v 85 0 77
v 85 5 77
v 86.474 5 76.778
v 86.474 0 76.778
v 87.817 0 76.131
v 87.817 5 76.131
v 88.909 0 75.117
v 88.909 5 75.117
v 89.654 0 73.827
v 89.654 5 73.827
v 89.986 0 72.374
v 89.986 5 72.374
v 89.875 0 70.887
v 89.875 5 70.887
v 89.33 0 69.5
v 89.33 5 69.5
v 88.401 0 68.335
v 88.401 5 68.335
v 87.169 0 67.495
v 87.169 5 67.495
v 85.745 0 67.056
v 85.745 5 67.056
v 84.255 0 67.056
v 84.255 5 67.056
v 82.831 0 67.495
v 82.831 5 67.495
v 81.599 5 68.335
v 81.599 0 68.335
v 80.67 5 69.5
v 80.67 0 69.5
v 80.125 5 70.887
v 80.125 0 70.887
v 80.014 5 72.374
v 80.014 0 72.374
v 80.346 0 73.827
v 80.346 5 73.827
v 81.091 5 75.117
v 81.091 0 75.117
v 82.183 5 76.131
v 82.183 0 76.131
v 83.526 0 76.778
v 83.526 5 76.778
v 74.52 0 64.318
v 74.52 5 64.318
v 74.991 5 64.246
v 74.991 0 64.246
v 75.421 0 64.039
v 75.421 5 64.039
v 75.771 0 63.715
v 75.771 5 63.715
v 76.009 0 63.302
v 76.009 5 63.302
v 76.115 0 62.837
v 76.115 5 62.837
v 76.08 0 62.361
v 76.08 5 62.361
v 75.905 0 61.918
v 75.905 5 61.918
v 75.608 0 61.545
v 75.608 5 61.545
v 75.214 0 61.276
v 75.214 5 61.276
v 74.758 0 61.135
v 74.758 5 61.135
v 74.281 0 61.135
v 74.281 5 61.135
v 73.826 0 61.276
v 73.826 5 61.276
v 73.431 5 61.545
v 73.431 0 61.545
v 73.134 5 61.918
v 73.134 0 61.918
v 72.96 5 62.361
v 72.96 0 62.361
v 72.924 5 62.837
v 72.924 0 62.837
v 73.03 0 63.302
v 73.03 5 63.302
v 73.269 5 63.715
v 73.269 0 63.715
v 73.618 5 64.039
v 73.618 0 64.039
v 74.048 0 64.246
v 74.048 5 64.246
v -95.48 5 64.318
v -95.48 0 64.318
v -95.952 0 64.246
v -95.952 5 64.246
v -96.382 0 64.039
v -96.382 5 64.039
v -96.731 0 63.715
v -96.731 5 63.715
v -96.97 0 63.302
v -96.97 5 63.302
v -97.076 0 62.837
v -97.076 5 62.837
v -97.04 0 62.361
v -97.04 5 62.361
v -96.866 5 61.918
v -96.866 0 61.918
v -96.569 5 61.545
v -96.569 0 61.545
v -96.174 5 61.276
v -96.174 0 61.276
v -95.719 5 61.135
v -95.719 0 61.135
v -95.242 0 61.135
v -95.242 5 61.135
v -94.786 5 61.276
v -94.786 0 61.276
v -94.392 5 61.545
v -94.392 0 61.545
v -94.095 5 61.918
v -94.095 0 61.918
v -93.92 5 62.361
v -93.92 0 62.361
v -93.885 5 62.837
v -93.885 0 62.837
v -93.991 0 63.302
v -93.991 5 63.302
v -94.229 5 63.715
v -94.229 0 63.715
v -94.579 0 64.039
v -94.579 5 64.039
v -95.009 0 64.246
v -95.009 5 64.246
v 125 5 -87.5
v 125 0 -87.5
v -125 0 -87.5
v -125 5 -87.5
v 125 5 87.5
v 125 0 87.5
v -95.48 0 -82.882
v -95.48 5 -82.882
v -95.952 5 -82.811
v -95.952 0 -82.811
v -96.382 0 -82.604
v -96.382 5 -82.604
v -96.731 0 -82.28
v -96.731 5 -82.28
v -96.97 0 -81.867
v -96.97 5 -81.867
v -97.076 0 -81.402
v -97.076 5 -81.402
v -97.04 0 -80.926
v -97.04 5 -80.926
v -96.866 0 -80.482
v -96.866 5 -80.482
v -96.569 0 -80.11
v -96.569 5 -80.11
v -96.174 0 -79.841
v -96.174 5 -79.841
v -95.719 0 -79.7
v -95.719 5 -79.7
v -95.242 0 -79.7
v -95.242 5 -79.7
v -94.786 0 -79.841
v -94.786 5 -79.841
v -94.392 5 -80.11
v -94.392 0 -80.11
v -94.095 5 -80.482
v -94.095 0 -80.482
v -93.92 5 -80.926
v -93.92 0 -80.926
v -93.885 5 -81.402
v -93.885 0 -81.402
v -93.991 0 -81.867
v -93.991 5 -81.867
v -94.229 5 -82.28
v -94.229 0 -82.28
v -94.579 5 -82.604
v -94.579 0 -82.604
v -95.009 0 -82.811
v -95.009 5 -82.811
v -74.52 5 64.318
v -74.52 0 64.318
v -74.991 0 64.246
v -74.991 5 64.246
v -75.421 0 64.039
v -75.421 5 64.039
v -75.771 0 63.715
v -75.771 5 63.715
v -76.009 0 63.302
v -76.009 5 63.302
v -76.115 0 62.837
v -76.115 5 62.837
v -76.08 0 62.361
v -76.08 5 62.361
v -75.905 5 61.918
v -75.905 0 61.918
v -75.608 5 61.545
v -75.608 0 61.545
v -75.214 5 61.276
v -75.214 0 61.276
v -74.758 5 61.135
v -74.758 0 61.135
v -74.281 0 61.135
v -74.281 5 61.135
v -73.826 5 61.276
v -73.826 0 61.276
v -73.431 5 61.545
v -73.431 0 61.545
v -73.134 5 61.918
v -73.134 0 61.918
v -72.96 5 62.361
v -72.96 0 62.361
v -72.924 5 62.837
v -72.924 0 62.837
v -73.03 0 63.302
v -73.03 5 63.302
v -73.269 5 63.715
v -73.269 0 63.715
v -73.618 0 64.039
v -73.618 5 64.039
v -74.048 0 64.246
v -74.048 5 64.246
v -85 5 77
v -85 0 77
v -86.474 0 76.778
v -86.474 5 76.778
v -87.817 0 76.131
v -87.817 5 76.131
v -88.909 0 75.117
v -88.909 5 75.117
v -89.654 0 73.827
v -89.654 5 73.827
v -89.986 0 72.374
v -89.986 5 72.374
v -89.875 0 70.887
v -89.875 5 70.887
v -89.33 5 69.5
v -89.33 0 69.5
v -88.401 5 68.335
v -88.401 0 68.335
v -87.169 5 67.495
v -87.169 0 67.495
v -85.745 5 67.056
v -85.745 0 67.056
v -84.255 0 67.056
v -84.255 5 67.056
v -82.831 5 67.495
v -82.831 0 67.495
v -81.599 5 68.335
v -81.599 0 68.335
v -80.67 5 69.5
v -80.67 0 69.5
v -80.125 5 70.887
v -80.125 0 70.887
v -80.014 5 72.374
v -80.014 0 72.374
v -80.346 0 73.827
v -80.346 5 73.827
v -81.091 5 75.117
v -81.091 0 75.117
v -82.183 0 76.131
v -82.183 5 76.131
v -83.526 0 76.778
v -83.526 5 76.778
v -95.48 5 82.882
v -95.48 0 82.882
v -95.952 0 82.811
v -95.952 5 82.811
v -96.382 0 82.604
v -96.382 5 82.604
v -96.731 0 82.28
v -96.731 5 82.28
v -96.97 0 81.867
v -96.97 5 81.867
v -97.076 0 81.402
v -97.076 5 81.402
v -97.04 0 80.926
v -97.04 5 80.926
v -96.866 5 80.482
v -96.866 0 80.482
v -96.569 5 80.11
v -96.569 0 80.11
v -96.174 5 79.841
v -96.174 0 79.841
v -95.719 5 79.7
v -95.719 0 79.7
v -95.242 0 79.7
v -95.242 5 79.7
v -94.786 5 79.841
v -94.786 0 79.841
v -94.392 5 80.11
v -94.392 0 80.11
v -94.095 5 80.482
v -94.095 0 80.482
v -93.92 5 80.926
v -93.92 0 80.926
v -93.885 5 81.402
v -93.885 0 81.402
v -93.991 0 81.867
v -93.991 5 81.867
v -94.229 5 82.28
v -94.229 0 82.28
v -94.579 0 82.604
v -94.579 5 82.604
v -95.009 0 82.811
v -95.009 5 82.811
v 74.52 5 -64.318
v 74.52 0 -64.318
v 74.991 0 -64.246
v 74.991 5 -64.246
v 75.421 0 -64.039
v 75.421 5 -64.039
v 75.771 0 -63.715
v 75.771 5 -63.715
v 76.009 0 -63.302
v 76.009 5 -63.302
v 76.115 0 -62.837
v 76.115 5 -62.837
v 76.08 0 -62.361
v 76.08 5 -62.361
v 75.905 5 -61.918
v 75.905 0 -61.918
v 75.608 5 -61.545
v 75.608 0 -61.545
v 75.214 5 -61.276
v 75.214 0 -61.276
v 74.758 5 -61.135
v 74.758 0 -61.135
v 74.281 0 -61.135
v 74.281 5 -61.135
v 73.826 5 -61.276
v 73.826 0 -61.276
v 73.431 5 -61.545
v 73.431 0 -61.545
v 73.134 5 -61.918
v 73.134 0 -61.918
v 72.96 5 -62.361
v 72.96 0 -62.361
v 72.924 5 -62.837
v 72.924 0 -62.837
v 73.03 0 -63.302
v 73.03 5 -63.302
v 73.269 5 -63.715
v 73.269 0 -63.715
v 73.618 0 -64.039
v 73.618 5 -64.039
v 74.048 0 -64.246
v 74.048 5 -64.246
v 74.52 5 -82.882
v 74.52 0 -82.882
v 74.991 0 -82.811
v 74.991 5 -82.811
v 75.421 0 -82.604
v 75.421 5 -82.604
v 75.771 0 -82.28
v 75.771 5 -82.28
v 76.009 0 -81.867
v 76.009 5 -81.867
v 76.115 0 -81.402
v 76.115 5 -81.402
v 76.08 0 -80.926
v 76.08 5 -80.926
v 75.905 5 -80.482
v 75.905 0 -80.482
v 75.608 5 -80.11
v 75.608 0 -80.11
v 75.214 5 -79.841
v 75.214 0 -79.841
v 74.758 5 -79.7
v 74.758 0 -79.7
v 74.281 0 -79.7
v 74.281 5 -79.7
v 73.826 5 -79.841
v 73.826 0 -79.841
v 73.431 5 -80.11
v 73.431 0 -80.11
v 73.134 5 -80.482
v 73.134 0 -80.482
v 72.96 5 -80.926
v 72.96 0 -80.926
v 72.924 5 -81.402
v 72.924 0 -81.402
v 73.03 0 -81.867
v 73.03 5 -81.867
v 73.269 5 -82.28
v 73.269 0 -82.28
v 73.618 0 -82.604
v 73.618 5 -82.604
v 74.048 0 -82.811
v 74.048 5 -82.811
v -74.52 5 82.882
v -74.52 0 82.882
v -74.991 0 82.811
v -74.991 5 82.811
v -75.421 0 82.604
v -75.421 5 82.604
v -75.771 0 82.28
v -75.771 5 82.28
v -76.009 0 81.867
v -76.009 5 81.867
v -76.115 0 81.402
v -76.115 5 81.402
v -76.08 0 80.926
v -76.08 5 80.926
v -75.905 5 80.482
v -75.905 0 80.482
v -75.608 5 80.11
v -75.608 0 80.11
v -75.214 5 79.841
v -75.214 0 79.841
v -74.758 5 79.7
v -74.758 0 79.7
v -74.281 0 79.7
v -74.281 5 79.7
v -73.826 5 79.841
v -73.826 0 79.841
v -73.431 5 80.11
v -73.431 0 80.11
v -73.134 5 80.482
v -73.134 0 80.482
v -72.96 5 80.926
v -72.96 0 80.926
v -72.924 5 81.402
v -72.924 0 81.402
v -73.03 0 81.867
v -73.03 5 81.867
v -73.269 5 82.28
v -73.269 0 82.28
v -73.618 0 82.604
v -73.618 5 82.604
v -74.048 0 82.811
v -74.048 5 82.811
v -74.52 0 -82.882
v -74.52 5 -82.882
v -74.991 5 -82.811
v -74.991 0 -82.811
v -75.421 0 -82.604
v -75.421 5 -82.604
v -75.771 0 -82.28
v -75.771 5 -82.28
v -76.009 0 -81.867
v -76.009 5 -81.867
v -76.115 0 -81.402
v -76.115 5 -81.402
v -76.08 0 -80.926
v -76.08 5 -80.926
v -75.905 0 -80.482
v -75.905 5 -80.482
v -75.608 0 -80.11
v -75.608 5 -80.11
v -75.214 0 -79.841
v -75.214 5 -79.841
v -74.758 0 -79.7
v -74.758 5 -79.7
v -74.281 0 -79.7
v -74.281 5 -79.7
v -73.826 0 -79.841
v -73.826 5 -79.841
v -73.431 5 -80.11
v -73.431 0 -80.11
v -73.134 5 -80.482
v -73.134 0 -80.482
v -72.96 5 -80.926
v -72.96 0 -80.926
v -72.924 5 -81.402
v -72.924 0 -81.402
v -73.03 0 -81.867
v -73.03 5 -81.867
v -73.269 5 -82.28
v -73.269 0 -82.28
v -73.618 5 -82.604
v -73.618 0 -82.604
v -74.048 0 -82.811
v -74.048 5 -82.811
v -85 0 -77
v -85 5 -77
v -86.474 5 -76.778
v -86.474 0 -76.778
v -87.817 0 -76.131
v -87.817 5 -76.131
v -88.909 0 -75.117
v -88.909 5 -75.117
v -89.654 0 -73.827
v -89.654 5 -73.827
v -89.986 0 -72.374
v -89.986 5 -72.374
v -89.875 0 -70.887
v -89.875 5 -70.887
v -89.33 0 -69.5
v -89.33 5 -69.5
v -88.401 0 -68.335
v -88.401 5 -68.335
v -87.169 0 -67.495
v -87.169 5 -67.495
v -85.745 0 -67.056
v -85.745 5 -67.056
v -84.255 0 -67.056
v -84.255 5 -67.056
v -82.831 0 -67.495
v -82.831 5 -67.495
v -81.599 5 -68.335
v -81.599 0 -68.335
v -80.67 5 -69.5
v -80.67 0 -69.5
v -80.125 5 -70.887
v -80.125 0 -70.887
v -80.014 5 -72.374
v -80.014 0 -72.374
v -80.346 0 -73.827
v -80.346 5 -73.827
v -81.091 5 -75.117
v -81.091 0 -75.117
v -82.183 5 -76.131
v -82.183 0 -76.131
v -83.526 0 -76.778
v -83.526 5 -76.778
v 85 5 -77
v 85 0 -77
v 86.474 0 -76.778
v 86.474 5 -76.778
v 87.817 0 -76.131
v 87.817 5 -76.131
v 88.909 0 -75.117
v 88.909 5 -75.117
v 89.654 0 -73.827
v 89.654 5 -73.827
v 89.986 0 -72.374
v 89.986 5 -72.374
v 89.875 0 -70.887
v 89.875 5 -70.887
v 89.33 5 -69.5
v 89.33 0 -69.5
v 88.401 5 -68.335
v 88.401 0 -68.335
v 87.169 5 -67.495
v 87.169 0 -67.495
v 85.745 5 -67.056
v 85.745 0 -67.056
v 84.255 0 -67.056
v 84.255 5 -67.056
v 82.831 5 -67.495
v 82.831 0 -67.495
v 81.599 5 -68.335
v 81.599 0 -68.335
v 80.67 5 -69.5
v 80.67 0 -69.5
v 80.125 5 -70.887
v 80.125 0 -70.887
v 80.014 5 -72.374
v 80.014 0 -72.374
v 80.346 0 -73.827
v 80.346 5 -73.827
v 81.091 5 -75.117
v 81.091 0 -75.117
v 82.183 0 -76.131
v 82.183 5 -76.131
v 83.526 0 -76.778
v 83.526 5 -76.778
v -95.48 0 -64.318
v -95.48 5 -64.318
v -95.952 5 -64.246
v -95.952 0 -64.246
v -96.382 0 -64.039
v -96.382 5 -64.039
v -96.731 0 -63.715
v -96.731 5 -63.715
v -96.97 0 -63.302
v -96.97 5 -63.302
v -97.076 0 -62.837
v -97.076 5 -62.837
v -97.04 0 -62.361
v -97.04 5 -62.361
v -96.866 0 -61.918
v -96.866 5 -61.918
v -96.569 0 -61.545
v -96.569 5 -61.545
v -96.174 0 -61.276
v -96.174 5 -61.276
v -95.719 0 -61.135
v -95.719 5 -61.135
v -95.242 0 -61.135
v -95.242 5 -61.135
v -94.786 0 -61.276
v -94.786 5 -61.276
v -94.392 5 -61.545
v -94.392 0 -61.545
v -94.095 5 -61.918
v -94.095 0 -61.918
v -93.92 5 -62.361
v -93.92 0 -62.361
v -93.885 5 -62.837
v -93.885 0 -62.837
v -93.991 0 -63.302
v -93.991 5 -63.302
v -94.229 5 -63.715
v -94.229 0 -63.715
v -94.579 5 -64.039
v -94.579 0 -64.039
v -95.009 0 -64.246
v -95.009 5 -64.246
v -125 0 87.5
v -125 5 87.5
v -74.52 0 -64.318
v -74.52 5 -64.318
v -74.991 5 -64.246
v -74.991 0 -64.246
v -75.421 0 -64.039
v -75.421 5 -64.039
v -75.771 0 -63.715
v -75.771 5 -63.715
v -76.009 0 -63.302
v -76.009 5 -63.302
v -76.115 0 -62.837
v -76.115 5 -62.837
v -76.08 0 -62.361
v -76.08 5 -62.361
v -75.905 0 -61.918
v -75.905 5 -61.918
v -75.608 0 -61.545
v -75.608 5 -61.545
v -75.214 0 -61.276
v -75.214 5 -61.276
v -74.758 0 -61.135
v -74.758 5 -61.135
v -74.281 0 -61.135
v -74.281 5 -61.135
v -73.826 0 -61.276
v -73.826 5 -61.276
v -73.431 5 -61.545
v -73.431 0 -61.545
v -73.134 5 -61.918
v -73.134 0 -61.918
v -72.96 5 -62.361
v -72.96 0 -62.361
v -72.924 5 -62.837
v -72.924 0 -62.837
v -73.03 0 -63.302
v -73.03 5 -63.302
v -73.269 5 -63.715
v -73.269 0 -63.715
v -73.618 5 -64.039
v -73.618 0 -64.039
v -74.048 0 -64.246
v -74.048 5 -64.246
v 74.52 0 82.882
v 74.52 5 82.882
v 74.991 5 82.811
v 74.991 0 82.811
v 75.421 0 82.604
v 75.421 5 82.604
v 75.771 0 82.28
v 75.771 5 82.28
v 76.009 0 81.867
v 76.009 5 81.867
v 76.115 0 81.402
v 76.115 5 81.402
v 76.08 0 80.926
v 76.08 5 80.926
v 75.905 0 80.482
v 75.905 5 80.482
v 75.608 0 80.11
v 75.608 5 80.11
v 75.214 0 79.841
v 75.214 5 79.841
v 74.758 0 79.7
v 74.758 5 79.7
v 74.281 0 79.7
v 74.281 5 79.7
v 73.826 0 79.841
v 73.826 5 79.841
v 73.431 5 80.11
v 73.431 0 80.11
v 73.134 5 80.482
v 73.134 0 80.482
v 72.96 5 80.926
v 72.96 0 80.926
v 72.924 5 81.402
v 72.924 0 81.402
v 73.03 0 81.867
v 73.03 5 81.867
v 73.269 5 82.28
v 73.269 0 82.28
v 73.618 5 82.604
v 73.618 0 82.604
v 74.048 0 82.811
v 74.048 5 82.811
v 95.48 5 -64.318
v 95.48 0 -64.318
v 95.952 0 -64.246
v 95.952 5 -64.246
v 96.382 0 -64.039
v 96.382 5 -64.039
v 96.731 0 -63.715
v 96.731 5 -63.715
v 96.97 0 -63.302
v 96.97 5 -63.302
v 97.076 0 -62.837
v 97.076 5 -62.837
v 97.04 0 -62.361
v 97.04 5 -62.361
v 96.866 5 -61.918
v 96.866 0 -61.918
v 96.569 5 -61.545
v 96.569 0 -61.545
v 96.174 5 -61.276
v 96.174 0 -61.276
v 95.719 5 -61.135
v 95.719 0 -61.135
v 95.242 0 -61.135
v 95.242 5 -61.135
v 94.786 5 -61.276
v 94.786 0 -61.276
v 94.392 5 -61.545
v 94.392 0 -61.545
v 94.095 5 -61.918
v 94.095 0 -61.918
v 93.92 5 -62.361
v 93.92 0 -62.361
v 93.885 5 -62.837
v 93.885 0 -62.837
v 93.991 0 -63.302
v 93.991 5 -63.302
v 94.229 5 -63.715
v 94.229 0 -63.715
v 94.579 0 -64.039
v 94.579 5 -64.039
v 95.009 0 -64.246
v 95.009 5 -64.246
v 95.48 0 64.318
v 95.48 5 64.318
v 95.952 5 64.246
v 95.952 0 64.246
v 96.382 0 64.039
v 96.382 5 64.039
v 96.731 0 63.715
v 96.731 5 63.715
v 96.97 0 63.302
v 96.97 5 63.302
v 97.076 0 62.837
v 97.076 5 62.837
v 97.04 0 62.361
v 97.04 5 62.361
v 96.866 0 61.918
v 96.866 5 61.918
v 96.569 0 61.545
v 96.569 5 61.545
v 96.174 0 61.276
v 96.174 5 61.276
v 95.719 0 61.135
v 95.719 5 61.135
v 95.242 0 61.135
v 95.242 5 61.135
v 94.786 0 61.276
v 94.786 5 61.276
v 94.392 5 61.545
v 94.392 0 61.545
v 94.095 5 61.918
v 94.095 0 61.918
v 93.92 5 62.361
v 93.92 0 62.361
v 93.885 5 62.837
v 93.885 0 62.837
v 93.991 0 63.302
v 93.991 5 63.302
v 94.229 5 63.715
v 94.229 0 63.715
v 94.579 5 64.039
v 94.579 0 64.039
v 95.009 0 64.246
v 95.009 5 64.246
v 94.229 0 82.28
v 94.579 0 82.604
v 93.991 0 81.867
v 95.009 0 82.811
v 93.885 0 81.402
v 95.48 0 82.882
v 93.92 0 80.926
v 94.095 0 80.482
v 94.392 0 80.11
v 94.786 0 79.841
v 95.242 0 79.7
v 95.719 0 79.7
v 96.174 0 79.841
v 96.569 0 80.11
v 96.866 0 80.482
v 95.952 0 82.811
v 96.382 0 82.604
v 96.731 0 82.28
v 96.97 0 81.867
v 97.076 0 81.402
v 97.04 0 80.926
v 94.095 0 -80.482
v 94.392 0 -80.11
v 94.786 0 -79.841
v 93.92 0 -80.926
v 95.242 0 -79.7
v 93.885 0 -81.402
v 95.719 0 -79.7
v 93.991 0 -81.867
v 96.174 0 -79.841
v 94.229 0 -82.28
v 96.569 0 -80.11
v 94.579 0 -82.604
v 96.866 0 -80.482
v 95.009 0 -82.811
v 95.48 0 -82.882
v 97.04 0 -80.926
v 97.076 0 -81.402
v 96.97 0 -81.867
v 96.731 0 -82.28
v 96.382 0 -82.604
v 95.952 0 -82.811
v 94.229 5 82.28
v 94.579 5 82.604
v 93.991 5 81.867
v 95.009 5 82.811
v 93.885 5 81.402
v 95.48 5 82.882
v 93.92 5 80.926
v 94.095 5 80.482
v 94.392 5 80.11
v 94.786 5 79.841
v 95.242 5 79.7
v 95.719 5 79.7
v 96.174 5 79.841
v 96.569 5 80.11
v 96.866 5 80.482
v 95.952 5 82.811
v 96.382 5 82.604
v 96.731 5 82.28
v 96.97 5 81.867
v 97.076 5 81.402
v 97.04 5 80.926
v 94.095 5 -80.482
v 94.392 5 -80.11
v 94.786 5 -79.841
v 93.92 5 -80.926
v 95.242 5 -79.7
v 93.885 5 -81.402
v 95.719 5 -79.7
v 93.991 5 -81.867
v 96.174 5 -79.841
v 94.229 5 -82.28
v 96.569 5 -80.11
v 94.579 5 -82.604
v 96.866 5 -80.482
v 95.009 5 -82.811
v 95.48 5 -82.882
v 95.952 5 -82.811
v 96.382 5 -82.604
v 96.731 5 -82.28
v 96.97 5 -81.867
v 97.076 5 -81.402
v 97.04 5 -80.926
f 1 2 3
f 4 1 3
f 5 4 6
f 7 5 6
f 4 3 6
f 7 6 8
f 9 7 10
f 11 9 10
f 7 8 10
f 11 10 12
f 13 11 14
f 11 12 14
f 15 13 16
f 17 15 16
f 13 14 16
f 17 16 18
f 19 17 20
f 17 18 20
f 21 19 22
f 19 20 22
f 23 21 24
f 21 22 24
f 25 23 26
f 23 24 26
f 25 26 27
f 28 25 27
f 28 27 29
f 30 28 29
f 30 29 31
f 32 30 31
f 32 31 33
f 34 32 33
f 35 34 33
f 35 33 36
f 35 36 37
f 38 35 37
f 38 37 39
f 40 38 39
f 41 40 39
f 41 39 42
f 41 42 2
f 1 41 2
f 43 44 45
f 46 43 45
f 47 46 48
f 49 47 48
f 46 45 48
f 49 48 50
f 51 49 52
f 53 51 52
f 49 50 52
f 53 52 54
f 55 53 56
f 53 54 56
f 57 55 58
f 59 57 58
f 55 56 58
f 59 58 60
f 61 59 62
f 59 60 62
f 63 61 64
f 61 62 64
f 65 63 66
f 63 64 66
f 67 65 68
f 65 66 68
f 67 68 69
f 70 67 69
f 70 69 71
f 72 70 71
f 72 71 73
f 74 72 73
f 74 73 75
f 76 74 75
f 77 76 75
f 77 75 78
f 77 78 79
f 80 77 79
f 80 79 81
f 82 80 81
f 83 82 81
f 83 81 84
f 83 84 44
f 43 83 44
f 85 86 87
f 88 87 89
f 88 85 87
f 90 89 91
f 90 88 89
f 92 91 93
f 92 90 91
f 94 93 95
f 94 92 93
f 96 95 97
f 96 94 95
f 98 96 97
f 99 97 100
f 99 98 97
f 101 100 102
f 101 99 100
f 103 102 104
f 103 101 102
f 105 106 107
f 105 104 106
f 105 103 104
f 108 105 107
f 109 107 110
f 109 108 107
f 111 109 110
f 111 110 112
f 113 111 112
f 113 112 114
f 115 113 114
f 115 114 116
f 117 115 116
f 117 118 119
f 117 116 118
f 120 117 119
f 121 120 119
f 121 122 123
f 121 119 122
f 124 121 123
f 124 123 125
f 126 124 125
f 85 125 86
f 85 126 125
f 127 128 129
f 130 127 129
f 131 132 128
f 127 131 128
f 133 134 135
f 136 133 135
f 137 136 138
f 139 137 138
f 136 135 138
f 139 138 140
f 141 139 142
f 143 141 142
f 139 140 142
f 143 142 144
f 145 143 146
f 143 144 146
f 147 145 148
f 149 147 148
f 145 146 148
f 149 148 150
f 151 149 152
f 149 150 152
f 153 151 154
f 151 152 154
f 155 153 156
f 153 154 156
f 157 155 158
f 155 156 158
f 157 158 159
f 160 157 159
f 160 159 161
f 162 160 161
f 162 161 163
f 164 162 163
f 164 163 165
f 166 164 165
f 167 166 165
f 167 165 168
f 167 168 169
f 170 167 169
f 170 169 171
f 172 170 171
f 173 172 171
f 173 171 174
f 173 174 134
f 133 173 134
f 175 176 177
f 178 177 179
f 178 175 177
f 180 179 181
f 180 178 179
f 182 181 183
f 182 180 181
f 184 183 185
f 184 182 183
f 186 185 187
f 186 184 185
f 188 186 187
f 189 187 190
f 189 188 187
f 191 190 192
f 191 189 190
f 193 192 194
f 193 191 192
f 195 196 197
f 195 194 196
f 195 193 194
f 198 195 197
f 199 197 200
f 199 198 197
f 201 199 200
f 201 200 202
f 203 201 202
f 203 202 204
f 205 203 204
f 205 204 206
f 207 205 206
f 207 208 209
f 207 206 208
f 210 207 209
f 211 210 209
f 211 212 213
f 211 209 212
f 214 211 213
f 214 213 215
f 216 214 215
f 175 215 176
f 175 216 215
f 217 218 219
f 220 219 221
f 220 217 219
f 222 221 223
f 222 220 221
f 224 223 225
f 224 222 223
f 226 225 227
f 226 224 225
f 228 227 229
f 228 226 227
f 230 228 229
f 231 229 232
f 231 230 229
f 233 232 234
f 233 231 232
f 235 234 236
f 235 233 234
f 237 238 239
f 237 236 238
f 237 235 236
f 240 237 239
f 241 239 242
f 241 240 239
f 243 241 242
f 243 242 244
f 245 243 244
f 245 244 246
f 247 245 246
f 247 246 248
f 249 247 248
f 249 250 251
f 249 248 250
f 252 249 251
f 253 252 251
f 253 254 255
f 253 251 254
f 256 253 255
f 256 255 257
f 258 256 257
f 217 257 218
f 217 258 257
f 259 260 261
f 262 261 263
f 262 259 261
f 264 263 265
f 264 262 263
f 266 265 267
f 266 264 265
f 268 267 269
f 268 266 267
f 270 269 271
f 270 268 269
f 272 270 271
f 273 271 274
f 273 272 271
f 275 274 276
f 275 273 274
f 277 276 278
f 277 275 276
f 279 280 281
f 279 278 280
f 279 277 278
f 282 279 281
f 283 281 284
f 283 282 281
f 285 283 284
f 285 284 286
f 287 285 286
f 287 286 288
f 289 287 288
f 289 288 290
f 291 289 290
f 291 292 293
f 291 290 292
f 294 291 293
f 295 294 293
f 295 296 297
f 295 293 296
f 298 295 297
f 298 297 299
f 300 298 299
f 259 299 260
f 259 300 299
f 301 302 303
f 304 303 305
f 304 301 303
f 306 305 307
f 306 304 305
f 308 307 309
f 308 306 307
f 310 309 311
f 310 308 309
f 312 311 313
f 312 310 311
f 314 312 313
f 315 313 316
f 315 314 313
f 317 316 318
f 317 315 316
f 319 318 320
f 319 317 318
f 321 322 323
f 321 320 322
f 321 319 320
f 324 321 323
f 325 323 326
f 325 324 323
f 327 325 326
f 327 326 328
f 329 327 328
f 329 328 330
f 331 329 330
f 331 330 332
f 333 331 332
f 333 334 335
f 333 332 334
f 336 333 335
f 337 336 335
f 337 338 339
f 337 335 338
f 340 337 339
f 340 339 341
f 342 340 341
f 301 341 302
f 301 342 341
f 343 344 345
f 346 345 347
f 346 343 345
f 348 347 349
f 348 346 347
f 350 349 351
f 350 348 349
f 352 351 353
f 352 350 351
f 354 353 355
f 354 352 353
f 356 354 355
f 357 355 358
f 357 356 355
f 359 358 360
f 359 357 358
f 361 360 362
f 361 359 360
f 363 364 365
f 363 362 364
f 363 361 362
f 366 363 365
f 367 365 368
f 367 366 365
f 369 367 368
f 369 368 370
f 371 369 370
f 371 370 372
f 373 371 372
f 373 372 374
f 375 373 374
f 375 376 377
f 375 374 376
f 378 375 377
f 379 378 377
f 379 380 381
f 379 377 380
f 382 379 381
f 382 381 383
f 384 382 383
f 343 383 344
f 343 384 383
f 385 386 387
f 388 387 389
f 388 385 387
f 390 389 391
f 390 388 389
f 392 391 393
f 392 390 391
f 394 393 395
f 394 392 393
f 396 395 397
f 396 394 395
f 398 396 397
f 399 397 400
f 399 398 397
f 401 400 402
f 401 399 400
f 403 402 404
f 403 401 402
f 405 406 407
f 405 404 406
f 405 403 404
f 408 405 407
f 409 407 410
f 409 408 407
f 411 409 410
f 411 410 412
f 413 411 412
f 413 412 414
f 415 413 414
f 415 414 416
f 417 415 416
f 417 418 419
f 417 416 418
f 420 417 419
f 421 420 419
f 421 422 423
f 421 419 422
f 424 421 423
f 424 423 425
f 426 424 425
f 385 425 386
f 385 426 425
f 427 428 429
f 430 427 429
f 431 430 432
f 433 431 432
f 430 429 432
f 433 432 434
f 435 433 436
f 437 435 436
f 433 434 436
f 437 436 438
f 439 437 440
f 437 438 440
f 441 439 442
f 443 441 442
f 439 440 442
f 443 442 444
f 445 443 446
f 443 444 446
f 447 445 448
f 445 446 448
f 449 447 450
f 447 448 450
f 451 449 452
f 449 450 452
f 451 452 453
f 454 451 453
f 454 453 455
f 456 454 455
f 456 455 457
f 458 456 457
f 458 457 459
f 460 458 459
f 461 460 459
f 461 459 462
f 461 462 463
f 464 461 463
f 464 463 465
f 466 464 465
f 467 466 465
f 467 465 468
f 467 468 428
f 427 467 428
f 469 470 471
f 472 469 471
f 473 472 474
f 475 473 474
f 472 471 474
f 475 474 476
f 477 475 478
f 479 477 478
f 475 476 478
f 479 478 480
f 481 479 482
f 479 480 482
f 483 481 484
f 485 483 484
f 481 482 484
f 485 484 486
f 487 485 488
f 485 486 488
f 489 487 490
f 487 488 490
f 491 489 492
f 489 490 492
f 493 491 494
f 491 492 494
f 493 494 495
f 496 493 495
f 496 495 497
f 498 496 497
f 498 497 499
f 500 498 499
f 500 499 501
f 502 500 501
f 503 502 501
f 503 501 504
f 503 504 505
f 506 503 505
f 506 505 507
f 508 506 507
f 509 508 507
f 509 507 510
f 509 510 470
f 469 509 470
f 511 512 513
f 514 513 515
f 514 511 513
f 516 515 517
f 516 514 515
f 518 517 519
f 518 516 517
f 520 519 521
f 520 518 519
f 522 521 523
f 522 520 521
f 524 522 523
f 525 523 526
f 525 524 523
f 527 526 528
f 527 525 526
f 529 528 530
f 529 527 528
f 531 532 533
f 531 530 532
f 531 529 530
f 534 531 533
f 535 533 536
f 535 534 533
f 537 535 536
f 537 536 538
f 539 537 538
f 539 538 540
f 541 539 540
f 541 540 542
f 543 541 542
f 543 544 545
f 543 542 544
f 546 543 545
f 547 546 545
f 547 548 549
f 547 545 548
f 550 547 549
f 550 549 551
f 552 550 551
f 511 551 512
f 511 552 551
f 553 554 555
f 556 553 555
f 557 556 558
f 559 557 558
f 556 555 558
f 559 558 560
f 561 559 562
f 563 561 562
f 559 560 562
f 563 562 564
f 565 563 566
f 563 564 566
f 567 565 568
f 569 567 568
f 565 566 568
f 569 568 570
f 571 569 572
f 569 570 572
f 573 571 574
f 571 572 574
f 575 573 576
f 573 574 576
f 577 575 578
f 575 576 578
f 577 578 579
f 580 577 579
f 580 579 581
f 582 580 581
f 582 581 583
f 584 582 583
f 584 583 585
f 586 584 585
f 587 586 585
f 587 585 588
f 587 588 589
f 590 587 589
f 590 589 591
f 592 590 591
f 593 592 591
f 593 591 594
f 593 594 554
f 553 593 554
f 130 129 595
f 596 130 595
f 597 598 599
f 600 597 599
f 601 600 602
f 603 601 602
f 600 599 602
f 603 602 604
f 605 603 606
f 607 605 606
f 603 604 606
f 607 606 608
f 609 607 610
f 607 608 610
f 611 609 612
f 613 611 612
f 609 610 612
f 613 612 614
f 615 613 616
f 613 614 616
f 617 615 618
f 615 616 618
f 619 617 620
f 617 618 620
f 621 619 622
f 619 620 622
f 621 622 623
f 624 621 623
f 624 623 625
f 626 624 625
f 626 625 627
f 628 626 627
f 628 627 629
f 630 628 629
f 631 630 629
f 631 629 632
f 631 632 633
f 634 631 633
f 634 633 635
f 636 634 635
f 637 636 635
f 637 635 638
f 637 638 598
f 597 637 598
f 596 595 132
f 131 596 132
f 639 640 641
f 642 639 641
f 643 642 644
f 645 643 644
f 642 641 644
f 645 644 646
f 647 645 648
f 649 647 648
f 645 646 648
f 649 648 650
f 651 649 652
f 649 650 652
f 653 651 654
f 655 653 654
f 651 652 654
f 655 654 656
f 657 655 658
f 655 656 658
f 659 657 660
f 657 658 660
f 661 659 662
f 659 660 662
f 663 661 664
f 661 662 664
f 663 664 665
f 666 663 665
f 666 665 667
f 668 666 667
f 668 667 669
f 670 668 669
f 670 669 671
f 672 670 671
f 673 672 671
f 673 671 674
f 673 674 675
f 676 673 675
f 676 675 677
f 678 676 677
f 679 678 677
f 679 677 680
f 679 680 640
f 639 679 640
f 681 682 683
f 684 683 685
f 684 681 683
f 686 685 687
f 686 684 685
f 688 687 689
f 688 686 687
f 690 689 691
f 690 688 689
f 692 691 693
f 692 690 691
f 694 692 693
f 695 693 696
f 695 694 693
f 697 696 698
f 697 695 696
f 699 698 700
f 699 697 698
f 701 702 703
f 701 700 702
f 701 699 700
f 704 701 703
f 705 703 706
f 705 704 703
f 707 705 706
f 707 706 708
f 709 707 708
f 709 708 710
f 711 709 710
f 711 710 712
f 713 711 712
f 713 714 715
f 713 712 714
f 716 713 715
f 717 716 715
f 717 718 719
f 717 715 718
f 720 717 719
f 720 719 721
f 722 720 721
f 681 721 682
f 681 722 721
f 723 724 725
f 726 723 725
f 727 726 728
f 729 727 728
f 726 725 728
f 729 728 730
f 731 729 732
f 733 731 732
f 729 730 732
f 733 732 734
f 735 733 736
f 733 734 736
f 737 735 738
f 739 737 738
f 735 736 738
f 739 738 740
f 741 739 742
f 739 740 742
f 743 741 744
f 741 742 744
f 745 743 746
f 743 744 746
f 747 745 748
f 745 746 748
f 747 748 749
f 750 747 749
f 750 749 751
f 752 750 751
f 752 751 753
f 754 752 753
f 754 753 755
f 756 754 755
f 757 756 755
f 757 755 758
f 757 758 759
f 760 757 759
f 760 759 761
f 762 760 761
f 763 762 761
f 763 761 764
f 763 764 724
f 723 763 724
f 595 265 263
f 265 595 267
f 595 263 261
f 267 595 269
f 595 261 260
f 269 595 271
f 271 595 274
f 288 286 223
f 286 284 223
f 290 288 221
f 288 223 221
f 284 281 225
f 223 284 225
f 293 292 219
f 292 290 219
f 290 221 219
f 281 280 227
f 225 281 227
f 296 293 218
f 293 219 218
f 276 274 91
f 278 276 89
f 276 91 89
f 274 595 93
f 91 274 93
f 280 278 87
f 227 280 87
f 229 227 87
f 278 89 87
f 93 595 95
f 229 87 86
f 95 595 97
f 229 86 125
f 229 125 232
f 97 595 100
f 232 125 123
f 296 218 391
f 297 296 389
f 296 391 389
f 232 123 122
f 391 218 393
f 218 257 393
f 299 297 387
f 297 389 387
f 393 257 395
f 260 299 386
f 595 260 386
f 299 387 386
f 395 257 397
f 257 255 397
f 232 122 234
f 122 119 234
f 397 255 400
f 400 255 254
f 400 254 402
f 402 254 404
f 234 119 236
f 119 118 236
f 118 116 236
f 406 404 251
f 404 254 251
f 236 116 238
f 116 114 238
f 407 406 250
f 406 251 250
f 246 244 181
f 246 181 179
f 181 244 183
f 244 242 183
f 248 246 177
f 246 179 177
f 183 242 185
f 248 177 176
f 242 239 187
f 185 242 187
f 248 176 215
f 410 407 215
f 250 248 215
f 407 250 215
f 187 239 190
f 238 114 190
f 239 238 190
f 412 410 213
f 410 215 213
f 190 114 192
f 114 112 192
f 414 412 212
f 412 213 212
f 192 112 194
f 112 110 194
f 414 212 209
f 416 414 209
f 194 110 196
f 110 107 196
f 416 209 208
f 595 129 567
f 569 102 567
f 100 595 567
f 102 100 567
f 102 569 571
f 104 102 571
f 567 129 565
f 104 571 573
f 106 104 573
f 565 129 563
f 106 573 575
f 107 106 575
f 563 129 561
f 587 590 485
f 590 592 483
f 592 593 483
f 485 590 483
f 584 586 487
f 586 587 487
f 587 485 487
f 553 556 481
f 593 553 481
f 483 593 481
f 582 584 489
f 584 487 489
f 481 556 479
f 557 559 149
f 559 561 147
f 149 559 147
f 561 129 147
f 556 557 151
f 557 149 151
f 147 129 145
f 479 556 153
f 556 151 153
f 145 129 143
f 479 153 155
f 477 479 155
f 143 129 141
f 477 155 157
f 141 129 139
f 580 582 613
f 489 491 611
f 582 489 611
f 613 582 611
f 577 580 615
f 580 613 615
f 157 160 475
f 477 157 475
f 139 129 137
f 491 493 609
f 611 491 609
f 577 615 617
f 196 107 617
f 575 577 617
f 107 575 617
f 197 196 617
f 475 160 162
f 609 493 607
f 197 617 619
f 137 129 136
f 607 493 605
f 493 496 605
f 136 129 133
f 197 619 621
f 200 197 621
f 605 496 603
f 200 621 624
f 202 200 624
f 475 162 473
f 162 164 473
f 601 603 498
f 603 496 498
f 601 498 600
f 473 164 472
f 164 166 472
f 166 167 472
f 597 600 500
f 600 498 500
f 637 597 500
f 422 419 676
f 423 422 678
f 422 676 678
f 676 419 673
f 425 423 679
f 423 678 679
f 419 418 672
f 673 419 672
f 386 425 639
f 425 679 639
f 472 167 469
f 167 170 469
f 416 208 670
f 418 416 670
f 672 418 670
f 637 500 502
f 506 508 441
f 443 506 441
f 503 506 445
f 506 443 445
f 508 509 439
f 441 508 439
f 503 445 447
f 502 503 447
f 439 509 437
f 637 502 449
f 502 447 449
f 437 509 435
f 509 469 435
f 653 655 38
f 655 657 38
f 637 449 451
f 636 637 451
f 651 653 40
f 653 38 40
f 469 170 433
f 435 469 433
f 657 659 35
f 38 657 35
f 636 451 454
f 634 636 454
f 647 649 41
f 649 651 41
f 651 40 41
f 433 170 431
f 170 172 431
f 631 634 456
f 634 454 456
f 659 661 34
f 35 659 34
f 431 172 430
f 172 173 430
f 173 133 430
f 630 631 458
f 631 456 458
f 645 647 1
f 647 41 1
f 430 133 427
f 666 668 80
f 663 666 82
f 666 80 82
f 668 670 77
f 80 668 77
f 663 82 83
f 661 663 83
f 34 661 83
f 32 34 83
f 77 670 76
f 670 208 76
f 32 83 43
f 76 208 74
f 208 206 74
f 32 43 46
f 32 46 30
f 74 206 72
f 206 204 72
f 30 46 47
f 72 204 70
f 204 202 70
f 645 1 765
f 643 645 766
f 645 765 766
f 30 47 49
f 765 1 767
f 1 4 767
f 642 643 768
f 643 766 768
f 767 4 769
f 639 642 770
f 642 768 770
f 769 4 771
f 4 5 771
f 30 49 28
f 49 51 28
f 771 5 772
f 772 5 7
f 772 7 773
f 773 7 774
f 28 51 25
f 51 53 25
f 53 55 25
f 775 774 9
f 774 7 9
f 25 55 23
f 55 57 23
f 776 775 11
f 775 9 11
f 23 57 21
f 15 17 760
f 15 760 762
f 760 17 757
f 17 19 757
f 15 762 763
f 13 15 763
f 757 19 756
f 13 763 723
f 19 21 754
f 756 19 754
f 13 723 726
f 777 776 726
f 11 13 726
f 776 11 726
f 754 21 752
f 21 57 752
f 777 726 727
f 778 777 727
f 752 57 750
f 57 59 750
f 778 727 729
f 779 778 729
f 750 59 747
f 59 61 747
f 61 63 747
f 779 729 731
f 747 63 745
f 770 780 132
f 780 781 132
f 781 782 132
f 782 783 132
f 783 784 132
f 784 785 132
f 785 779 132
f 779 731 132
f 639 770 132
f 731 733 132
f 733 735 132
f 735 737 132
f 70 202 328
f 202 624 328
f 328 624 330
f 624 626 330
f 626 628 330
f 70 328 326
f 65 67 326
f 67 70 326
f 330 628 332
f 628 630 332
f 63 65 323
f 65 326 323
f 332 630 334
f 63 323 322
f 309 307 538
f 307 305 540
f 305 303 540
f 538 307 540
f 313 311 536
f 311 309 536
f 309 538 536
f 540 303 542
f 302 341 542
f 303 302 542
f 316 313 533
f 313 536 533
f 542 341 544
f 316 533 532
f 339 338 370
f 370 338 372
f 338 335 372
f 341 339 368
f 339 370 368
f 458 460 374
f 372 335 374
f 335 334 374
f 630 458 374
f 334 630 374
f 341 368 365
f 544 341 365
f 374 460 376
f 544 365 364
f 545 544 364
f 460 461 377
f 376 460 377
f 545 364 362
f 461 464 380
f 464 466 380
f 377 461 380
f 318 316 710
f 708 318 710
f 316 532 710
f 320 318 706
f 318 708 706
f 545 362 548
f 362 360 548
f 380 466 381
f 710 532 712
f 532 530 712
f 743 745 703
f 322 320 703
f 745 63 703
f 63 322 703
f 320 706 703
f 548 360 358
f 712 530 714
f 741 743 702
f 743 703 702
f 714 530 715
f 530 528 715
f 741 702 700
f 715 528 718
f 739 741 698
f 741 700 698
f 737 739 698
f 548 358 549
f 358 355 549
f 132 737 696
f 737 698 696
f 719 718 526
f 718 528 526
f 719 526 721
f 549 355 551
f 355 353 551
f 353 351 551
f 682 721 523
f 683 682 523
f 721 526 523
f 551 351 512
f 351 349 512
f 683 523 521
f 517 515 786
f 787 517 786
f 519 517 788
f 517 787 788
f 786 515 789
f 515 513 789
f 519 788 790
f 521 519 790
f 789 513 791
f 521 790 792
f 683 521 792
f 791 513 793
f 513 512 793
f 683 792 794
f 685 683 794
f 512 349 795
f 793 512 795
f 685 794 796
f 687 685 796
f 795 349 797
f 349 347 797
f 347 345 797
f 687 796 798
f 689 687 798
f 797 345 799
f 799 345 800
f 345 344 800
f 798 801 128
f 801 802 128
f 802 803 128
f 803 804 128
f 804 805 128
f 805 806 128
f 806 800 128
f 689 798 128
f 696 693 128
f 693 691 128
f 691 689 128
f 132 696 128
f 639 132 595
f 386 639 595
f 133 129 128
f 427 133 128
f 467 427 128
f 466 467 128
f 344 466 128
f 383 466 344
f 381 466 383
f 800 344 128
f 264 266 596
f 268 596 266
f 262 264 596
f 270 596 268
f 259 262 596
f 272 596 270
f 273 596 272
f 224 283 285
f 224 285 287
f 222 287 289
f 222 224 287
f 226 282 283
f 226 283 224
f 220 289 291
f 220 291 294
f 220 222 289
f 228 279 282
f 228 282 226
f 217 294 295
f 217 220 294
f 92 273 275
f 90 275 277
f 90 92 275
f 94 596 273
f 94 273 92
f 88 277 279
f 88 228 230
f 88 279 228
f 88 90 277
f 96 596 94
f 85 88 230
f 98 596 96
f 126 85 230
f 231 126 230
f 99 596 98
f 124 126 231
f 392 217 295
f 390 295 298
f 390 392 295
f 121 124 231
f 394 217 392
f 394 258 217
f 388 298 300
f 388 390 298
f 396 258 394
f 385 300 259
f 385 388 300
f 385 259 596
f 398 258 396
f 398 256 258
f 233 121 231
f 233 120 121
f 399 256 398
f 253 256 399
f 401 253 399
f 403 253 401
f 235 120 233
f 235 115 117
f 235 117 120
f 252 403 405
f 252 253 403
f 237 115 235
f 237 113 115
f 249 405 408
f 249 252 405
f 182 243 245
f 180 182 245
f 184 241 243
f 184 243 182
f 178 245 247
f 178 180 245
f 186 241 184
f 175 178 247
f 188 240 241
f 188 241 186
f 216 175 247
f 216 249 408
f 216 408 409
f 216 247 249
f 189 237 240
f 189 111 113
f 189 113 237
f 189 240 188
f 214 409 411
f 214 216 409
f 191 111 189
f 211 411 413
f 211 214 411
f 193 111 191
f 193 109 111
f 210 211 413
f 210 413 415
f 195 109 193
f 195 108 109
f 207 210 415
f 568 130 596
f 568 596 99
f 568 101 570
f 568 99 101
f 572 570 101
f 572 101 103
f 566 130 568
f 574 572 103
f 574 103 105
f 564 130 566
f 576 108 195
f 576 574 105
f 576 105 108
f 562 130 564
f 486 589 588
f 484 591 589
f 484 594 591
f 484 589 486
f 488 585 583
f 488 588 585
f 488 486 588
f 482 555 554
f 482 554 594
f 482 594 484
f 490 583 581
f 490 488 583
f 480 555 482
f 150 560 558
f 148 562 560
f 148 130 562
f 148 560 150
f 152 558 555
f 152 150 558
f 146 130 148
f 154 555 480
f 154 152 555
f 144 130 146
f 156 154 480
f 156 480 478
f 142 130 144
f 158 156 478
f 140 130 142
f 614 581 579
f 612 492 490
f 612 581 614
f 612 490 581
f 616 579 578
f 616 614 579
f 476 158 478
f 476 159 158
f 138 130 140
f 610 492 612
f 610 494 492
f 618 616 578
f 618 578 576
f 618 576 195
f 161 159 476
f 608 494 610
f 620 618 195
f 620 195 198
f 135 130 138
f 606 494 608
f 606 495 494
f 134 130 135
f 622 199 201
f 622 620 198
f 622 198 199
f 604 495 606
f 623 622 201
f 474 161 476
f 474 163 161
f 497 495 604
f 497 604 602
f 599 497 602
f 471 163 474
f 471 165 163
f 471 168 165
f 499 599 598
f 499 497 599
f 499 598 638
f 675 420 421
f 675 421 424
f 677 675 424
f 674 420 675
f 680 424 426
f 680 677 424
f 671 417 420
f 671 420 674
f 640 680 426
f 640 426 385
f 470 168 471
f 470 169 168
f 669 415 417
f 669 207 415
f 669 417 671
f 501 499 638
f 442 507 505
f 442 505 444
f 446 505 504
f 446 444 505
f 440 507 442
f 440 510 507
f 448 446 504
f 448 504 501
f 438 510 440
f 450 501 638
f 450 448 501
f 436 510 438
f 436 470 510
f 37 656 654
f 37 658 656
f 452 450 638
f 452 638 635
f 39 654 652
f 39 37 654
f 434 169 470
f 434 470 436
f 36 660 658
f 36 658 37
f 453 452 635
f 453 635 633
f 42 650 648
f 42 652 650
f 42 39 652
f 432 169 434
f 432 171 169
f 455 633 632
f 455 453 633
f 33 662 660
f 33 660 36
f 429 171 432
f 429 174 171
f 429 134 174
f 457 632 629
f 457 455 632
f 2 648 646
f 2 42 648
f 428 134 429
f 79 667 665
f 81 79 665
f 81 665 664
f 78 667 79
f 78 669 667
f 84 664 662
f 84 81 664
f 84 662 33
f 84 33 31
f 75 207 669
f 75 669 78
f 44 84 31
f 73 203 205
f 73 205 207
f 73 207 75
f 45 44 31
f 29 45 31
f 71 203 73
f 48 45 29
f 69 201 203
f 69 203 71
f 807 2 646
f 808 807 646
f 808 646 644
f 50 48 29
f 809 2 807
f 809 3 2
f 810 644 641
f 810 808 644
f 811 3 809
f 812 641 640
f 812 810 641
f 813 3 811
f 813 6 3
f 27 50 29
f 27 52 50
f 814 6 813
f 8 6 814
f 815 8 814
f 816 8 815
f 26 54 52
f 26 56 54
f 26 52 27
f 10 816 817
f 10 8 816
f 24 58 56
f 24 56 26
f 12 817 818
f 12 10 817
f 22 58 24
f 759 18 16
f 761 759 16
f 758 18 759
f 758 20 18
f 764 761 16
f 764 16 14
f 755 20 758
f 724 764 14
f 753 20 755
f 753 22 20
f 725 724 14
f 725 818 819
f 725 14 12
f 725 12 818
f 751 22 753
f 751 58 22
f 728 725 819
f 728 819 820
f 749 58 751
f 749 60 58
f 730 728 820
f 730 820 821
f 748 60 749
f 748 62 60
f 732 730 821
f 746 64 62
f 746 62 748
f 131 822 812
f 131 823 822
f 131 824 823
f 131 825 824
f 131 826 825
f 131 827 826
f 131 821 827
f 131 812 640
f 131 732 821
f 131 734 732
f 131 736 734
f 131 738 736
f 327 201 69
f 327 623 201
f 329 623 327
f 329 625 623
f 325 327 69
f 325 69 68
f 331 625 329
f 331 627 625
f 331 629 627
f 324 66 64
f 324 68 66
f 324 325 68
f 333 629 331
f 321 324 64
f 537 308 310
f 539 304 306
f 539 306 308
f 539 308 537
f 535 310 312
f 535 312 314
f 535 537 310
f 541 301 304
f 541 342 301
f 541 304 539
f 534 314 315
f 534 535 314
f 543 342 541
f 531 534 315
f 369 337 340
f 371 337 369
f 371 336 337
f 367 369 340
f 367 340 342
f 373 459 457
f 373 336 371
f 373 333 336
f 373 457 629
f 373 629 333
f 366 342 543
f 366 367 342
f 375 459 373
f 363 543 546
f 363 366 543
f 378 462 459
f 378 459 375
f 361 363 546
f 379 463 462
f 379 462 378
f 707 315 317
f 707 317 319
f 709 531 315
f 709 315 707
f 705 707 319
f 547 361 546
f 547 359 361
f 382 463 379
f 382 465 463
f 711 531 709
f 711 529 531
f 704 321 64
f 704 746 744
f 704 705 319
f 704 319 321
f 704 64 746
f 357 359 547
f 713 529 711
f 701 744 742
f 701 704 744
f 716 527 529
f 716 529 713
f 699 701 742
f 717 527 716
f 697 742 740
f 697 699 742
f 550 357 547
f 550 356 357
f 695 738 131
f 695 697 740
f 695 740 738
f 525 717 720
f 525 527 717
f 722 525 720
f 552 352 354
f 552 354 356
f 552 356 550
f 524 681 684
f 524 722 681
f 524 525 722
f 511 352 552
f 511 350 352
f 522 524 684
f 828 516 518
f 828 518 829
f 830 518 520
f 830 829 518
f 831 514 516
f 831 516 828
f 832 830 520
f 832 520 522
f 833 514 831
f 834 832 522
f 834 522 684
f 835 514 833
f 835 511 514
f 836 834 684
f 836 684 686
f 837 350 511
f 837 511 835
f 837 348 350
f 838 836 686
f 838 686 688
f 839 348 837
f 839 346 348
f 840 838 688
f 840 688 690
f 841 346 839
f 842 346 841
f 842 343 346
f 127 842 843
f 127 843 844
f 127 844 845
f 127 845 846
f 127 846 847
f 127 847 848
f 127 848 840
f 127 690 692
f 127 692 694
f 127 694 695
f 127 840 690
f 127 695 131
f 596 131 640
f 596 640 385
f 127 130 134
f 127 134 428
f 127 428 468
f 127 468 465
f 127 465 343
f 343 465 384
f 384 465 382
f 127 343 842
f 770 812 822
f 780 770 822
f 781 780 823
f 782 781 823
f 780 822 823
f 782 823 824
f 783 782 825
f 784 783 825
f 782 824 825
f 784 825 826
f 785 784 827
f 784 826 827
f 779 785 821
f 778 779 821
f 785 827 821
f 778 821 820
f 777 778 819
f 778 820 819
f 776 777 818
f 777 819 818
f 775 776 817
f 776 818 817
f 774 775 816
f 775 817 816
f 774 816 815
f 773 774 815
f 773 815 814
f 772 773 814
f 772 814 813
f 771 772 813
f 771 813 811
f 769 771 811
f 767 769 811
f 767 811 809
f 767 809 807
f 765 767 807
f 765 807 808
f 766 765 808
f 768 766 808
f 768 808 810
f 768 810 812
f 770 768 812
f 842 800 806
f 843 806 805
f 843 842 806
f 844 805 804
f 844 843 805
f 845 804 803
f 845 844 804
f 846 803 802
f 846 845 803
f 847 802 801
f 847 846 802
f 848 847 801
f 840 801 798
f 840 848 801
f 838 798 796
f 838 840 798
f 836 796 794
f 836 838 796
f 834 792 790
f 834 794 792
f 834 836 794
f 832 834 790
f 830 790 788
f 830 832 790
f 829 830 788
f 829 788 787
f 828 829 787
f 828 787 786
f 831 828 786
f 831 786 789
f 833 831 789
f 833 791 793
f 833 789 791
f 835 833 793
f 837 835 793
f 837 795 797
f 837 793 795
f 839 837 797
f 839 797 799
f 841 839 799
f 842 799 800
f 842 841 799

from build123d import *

# Parameters (mm, degrees)
BOSS_EXTRU_1_DEPTH          = 5
ESQUISSE2_R                 = 5
ESQUISSE2_R_2               = 1.6
ENL_V_MAT_EXTRU_4_DEPTH     = 10
SYM_TRIE2_COPY_1_SKETCH_R   = 5
SYM_TRIE2_COPY_1_SKETCH_R_2 = 1.6
SYM_TRIE2_COPY_1_DEPTH      = 10


with BuildPart() as part:
    # Esquisse1 → Boss.-Extru.1 (new body)
    with BuildSketch(Plane(origin=(0, 0, 0), x_dir=(1, 0, 0), z_dir=(0, 1, 0))):
        Polygon((45, 87.5), (-70, 87.5), (-125, 87.5), (-125, 67.5), (-125, -67.5), (-125, -87.5), (-70, -87.5), (45, -87.5), (125, -87.5), (125, -42.5), (125, 42.5), (125, 87.5), align=None)
    extrude(amount=BOSS_EXTRU_1_DEPTH)

    # Esquisse2 → Enlèv. mat.-Extru.4 (cut)
    with BuildSketch(Plane(origin=(0, 5, 0), x_dir=(1, 0, 0), z_dir=(0, 1, 0))):
        with Locations(Location((85, -72, 0), (0, 0, 270))):
            Circle(ESQUISSE2_R)
        with Locations(Location((74.519765478, -62.717506566, 0), (0, 0, 270))):
            Circle(ESQUISSE2_R_2)
        with Locations(Location((74.519765478, -81.282493434, 0), (0, 0, 270))):
            Circle(ESQUISSE2_R_2)
        with Locations(Location((95.480234522, -81.282493434, 0), (0, 0, 270))):
            Circle(ESQUISSE2_R_2)
        with Locations(Location((95.480234522, -62.717506566, 0), (0, 0, 270))):
            Circle(ESQUISSE2_R_2)
    enl_v_mat_extru_4 = extrude(amount=-ENL_V_MAT_EXTRU_4_DEPTH, mode=Mode.SUBTRACT)

    # Symétrie1: Enlèv. mat.-Extru.4 across plane
    add(enl_v_mat_extru_4.mirror(Plane.XY), mode=Mode.SUBTRACT)

    # Symétrie2: Enlèv. mat.-Extru.4 across plane
    add(enl_v_mat_extru_4.mirror(Plane(origin=(0, 0, 0), x_dir=(0, 0, 1), z_dir=(1, 0, 0))), mode=Mode.SUBTRACT)

    # Symétrie2 copy 1 sketch → Symétrie2 copy 1 (cut)
    with BuildSketch(Plane(origin=(0, 5, 0), x_dir=(-1, 0, 0), z_dir=(0, 1, 0))):
        with Locations(Location((85, -72, 0), (0, 0, 270))):
            Circle(SYM_TRIE2_COPY_1_SKETCH_R)
        with Locations(Location((74.519765478, -62.717506566, 0), (0, 0, 270))):
            Circle(SYM_TRIE2_COPY_1_SKETCH_R_2)
        with Locations(Location((74.519765478, -81.282493434, 0), (0, 0, 270))):
            Circle(SYM_TRIE2_COPY_1_SKETCH_R_2)
        with Locations(Location((95.480234522, -81.282493434, 0), (0, 0, 270))):
            Circle(SYM_TRIE2_COPY_1_SKETCH_R_2)
        with Locations(Location((95.480234522, -62.717506566, 0), (0, 0, 270))):
            Circle(SYM_TRIE2_COPY_1_SKETCH_R_2)
    extrude(amount=-SYM_TRIE2_COPY_1_DEPTH, mode=Mode.SUBTRACT)


solid = part.part
